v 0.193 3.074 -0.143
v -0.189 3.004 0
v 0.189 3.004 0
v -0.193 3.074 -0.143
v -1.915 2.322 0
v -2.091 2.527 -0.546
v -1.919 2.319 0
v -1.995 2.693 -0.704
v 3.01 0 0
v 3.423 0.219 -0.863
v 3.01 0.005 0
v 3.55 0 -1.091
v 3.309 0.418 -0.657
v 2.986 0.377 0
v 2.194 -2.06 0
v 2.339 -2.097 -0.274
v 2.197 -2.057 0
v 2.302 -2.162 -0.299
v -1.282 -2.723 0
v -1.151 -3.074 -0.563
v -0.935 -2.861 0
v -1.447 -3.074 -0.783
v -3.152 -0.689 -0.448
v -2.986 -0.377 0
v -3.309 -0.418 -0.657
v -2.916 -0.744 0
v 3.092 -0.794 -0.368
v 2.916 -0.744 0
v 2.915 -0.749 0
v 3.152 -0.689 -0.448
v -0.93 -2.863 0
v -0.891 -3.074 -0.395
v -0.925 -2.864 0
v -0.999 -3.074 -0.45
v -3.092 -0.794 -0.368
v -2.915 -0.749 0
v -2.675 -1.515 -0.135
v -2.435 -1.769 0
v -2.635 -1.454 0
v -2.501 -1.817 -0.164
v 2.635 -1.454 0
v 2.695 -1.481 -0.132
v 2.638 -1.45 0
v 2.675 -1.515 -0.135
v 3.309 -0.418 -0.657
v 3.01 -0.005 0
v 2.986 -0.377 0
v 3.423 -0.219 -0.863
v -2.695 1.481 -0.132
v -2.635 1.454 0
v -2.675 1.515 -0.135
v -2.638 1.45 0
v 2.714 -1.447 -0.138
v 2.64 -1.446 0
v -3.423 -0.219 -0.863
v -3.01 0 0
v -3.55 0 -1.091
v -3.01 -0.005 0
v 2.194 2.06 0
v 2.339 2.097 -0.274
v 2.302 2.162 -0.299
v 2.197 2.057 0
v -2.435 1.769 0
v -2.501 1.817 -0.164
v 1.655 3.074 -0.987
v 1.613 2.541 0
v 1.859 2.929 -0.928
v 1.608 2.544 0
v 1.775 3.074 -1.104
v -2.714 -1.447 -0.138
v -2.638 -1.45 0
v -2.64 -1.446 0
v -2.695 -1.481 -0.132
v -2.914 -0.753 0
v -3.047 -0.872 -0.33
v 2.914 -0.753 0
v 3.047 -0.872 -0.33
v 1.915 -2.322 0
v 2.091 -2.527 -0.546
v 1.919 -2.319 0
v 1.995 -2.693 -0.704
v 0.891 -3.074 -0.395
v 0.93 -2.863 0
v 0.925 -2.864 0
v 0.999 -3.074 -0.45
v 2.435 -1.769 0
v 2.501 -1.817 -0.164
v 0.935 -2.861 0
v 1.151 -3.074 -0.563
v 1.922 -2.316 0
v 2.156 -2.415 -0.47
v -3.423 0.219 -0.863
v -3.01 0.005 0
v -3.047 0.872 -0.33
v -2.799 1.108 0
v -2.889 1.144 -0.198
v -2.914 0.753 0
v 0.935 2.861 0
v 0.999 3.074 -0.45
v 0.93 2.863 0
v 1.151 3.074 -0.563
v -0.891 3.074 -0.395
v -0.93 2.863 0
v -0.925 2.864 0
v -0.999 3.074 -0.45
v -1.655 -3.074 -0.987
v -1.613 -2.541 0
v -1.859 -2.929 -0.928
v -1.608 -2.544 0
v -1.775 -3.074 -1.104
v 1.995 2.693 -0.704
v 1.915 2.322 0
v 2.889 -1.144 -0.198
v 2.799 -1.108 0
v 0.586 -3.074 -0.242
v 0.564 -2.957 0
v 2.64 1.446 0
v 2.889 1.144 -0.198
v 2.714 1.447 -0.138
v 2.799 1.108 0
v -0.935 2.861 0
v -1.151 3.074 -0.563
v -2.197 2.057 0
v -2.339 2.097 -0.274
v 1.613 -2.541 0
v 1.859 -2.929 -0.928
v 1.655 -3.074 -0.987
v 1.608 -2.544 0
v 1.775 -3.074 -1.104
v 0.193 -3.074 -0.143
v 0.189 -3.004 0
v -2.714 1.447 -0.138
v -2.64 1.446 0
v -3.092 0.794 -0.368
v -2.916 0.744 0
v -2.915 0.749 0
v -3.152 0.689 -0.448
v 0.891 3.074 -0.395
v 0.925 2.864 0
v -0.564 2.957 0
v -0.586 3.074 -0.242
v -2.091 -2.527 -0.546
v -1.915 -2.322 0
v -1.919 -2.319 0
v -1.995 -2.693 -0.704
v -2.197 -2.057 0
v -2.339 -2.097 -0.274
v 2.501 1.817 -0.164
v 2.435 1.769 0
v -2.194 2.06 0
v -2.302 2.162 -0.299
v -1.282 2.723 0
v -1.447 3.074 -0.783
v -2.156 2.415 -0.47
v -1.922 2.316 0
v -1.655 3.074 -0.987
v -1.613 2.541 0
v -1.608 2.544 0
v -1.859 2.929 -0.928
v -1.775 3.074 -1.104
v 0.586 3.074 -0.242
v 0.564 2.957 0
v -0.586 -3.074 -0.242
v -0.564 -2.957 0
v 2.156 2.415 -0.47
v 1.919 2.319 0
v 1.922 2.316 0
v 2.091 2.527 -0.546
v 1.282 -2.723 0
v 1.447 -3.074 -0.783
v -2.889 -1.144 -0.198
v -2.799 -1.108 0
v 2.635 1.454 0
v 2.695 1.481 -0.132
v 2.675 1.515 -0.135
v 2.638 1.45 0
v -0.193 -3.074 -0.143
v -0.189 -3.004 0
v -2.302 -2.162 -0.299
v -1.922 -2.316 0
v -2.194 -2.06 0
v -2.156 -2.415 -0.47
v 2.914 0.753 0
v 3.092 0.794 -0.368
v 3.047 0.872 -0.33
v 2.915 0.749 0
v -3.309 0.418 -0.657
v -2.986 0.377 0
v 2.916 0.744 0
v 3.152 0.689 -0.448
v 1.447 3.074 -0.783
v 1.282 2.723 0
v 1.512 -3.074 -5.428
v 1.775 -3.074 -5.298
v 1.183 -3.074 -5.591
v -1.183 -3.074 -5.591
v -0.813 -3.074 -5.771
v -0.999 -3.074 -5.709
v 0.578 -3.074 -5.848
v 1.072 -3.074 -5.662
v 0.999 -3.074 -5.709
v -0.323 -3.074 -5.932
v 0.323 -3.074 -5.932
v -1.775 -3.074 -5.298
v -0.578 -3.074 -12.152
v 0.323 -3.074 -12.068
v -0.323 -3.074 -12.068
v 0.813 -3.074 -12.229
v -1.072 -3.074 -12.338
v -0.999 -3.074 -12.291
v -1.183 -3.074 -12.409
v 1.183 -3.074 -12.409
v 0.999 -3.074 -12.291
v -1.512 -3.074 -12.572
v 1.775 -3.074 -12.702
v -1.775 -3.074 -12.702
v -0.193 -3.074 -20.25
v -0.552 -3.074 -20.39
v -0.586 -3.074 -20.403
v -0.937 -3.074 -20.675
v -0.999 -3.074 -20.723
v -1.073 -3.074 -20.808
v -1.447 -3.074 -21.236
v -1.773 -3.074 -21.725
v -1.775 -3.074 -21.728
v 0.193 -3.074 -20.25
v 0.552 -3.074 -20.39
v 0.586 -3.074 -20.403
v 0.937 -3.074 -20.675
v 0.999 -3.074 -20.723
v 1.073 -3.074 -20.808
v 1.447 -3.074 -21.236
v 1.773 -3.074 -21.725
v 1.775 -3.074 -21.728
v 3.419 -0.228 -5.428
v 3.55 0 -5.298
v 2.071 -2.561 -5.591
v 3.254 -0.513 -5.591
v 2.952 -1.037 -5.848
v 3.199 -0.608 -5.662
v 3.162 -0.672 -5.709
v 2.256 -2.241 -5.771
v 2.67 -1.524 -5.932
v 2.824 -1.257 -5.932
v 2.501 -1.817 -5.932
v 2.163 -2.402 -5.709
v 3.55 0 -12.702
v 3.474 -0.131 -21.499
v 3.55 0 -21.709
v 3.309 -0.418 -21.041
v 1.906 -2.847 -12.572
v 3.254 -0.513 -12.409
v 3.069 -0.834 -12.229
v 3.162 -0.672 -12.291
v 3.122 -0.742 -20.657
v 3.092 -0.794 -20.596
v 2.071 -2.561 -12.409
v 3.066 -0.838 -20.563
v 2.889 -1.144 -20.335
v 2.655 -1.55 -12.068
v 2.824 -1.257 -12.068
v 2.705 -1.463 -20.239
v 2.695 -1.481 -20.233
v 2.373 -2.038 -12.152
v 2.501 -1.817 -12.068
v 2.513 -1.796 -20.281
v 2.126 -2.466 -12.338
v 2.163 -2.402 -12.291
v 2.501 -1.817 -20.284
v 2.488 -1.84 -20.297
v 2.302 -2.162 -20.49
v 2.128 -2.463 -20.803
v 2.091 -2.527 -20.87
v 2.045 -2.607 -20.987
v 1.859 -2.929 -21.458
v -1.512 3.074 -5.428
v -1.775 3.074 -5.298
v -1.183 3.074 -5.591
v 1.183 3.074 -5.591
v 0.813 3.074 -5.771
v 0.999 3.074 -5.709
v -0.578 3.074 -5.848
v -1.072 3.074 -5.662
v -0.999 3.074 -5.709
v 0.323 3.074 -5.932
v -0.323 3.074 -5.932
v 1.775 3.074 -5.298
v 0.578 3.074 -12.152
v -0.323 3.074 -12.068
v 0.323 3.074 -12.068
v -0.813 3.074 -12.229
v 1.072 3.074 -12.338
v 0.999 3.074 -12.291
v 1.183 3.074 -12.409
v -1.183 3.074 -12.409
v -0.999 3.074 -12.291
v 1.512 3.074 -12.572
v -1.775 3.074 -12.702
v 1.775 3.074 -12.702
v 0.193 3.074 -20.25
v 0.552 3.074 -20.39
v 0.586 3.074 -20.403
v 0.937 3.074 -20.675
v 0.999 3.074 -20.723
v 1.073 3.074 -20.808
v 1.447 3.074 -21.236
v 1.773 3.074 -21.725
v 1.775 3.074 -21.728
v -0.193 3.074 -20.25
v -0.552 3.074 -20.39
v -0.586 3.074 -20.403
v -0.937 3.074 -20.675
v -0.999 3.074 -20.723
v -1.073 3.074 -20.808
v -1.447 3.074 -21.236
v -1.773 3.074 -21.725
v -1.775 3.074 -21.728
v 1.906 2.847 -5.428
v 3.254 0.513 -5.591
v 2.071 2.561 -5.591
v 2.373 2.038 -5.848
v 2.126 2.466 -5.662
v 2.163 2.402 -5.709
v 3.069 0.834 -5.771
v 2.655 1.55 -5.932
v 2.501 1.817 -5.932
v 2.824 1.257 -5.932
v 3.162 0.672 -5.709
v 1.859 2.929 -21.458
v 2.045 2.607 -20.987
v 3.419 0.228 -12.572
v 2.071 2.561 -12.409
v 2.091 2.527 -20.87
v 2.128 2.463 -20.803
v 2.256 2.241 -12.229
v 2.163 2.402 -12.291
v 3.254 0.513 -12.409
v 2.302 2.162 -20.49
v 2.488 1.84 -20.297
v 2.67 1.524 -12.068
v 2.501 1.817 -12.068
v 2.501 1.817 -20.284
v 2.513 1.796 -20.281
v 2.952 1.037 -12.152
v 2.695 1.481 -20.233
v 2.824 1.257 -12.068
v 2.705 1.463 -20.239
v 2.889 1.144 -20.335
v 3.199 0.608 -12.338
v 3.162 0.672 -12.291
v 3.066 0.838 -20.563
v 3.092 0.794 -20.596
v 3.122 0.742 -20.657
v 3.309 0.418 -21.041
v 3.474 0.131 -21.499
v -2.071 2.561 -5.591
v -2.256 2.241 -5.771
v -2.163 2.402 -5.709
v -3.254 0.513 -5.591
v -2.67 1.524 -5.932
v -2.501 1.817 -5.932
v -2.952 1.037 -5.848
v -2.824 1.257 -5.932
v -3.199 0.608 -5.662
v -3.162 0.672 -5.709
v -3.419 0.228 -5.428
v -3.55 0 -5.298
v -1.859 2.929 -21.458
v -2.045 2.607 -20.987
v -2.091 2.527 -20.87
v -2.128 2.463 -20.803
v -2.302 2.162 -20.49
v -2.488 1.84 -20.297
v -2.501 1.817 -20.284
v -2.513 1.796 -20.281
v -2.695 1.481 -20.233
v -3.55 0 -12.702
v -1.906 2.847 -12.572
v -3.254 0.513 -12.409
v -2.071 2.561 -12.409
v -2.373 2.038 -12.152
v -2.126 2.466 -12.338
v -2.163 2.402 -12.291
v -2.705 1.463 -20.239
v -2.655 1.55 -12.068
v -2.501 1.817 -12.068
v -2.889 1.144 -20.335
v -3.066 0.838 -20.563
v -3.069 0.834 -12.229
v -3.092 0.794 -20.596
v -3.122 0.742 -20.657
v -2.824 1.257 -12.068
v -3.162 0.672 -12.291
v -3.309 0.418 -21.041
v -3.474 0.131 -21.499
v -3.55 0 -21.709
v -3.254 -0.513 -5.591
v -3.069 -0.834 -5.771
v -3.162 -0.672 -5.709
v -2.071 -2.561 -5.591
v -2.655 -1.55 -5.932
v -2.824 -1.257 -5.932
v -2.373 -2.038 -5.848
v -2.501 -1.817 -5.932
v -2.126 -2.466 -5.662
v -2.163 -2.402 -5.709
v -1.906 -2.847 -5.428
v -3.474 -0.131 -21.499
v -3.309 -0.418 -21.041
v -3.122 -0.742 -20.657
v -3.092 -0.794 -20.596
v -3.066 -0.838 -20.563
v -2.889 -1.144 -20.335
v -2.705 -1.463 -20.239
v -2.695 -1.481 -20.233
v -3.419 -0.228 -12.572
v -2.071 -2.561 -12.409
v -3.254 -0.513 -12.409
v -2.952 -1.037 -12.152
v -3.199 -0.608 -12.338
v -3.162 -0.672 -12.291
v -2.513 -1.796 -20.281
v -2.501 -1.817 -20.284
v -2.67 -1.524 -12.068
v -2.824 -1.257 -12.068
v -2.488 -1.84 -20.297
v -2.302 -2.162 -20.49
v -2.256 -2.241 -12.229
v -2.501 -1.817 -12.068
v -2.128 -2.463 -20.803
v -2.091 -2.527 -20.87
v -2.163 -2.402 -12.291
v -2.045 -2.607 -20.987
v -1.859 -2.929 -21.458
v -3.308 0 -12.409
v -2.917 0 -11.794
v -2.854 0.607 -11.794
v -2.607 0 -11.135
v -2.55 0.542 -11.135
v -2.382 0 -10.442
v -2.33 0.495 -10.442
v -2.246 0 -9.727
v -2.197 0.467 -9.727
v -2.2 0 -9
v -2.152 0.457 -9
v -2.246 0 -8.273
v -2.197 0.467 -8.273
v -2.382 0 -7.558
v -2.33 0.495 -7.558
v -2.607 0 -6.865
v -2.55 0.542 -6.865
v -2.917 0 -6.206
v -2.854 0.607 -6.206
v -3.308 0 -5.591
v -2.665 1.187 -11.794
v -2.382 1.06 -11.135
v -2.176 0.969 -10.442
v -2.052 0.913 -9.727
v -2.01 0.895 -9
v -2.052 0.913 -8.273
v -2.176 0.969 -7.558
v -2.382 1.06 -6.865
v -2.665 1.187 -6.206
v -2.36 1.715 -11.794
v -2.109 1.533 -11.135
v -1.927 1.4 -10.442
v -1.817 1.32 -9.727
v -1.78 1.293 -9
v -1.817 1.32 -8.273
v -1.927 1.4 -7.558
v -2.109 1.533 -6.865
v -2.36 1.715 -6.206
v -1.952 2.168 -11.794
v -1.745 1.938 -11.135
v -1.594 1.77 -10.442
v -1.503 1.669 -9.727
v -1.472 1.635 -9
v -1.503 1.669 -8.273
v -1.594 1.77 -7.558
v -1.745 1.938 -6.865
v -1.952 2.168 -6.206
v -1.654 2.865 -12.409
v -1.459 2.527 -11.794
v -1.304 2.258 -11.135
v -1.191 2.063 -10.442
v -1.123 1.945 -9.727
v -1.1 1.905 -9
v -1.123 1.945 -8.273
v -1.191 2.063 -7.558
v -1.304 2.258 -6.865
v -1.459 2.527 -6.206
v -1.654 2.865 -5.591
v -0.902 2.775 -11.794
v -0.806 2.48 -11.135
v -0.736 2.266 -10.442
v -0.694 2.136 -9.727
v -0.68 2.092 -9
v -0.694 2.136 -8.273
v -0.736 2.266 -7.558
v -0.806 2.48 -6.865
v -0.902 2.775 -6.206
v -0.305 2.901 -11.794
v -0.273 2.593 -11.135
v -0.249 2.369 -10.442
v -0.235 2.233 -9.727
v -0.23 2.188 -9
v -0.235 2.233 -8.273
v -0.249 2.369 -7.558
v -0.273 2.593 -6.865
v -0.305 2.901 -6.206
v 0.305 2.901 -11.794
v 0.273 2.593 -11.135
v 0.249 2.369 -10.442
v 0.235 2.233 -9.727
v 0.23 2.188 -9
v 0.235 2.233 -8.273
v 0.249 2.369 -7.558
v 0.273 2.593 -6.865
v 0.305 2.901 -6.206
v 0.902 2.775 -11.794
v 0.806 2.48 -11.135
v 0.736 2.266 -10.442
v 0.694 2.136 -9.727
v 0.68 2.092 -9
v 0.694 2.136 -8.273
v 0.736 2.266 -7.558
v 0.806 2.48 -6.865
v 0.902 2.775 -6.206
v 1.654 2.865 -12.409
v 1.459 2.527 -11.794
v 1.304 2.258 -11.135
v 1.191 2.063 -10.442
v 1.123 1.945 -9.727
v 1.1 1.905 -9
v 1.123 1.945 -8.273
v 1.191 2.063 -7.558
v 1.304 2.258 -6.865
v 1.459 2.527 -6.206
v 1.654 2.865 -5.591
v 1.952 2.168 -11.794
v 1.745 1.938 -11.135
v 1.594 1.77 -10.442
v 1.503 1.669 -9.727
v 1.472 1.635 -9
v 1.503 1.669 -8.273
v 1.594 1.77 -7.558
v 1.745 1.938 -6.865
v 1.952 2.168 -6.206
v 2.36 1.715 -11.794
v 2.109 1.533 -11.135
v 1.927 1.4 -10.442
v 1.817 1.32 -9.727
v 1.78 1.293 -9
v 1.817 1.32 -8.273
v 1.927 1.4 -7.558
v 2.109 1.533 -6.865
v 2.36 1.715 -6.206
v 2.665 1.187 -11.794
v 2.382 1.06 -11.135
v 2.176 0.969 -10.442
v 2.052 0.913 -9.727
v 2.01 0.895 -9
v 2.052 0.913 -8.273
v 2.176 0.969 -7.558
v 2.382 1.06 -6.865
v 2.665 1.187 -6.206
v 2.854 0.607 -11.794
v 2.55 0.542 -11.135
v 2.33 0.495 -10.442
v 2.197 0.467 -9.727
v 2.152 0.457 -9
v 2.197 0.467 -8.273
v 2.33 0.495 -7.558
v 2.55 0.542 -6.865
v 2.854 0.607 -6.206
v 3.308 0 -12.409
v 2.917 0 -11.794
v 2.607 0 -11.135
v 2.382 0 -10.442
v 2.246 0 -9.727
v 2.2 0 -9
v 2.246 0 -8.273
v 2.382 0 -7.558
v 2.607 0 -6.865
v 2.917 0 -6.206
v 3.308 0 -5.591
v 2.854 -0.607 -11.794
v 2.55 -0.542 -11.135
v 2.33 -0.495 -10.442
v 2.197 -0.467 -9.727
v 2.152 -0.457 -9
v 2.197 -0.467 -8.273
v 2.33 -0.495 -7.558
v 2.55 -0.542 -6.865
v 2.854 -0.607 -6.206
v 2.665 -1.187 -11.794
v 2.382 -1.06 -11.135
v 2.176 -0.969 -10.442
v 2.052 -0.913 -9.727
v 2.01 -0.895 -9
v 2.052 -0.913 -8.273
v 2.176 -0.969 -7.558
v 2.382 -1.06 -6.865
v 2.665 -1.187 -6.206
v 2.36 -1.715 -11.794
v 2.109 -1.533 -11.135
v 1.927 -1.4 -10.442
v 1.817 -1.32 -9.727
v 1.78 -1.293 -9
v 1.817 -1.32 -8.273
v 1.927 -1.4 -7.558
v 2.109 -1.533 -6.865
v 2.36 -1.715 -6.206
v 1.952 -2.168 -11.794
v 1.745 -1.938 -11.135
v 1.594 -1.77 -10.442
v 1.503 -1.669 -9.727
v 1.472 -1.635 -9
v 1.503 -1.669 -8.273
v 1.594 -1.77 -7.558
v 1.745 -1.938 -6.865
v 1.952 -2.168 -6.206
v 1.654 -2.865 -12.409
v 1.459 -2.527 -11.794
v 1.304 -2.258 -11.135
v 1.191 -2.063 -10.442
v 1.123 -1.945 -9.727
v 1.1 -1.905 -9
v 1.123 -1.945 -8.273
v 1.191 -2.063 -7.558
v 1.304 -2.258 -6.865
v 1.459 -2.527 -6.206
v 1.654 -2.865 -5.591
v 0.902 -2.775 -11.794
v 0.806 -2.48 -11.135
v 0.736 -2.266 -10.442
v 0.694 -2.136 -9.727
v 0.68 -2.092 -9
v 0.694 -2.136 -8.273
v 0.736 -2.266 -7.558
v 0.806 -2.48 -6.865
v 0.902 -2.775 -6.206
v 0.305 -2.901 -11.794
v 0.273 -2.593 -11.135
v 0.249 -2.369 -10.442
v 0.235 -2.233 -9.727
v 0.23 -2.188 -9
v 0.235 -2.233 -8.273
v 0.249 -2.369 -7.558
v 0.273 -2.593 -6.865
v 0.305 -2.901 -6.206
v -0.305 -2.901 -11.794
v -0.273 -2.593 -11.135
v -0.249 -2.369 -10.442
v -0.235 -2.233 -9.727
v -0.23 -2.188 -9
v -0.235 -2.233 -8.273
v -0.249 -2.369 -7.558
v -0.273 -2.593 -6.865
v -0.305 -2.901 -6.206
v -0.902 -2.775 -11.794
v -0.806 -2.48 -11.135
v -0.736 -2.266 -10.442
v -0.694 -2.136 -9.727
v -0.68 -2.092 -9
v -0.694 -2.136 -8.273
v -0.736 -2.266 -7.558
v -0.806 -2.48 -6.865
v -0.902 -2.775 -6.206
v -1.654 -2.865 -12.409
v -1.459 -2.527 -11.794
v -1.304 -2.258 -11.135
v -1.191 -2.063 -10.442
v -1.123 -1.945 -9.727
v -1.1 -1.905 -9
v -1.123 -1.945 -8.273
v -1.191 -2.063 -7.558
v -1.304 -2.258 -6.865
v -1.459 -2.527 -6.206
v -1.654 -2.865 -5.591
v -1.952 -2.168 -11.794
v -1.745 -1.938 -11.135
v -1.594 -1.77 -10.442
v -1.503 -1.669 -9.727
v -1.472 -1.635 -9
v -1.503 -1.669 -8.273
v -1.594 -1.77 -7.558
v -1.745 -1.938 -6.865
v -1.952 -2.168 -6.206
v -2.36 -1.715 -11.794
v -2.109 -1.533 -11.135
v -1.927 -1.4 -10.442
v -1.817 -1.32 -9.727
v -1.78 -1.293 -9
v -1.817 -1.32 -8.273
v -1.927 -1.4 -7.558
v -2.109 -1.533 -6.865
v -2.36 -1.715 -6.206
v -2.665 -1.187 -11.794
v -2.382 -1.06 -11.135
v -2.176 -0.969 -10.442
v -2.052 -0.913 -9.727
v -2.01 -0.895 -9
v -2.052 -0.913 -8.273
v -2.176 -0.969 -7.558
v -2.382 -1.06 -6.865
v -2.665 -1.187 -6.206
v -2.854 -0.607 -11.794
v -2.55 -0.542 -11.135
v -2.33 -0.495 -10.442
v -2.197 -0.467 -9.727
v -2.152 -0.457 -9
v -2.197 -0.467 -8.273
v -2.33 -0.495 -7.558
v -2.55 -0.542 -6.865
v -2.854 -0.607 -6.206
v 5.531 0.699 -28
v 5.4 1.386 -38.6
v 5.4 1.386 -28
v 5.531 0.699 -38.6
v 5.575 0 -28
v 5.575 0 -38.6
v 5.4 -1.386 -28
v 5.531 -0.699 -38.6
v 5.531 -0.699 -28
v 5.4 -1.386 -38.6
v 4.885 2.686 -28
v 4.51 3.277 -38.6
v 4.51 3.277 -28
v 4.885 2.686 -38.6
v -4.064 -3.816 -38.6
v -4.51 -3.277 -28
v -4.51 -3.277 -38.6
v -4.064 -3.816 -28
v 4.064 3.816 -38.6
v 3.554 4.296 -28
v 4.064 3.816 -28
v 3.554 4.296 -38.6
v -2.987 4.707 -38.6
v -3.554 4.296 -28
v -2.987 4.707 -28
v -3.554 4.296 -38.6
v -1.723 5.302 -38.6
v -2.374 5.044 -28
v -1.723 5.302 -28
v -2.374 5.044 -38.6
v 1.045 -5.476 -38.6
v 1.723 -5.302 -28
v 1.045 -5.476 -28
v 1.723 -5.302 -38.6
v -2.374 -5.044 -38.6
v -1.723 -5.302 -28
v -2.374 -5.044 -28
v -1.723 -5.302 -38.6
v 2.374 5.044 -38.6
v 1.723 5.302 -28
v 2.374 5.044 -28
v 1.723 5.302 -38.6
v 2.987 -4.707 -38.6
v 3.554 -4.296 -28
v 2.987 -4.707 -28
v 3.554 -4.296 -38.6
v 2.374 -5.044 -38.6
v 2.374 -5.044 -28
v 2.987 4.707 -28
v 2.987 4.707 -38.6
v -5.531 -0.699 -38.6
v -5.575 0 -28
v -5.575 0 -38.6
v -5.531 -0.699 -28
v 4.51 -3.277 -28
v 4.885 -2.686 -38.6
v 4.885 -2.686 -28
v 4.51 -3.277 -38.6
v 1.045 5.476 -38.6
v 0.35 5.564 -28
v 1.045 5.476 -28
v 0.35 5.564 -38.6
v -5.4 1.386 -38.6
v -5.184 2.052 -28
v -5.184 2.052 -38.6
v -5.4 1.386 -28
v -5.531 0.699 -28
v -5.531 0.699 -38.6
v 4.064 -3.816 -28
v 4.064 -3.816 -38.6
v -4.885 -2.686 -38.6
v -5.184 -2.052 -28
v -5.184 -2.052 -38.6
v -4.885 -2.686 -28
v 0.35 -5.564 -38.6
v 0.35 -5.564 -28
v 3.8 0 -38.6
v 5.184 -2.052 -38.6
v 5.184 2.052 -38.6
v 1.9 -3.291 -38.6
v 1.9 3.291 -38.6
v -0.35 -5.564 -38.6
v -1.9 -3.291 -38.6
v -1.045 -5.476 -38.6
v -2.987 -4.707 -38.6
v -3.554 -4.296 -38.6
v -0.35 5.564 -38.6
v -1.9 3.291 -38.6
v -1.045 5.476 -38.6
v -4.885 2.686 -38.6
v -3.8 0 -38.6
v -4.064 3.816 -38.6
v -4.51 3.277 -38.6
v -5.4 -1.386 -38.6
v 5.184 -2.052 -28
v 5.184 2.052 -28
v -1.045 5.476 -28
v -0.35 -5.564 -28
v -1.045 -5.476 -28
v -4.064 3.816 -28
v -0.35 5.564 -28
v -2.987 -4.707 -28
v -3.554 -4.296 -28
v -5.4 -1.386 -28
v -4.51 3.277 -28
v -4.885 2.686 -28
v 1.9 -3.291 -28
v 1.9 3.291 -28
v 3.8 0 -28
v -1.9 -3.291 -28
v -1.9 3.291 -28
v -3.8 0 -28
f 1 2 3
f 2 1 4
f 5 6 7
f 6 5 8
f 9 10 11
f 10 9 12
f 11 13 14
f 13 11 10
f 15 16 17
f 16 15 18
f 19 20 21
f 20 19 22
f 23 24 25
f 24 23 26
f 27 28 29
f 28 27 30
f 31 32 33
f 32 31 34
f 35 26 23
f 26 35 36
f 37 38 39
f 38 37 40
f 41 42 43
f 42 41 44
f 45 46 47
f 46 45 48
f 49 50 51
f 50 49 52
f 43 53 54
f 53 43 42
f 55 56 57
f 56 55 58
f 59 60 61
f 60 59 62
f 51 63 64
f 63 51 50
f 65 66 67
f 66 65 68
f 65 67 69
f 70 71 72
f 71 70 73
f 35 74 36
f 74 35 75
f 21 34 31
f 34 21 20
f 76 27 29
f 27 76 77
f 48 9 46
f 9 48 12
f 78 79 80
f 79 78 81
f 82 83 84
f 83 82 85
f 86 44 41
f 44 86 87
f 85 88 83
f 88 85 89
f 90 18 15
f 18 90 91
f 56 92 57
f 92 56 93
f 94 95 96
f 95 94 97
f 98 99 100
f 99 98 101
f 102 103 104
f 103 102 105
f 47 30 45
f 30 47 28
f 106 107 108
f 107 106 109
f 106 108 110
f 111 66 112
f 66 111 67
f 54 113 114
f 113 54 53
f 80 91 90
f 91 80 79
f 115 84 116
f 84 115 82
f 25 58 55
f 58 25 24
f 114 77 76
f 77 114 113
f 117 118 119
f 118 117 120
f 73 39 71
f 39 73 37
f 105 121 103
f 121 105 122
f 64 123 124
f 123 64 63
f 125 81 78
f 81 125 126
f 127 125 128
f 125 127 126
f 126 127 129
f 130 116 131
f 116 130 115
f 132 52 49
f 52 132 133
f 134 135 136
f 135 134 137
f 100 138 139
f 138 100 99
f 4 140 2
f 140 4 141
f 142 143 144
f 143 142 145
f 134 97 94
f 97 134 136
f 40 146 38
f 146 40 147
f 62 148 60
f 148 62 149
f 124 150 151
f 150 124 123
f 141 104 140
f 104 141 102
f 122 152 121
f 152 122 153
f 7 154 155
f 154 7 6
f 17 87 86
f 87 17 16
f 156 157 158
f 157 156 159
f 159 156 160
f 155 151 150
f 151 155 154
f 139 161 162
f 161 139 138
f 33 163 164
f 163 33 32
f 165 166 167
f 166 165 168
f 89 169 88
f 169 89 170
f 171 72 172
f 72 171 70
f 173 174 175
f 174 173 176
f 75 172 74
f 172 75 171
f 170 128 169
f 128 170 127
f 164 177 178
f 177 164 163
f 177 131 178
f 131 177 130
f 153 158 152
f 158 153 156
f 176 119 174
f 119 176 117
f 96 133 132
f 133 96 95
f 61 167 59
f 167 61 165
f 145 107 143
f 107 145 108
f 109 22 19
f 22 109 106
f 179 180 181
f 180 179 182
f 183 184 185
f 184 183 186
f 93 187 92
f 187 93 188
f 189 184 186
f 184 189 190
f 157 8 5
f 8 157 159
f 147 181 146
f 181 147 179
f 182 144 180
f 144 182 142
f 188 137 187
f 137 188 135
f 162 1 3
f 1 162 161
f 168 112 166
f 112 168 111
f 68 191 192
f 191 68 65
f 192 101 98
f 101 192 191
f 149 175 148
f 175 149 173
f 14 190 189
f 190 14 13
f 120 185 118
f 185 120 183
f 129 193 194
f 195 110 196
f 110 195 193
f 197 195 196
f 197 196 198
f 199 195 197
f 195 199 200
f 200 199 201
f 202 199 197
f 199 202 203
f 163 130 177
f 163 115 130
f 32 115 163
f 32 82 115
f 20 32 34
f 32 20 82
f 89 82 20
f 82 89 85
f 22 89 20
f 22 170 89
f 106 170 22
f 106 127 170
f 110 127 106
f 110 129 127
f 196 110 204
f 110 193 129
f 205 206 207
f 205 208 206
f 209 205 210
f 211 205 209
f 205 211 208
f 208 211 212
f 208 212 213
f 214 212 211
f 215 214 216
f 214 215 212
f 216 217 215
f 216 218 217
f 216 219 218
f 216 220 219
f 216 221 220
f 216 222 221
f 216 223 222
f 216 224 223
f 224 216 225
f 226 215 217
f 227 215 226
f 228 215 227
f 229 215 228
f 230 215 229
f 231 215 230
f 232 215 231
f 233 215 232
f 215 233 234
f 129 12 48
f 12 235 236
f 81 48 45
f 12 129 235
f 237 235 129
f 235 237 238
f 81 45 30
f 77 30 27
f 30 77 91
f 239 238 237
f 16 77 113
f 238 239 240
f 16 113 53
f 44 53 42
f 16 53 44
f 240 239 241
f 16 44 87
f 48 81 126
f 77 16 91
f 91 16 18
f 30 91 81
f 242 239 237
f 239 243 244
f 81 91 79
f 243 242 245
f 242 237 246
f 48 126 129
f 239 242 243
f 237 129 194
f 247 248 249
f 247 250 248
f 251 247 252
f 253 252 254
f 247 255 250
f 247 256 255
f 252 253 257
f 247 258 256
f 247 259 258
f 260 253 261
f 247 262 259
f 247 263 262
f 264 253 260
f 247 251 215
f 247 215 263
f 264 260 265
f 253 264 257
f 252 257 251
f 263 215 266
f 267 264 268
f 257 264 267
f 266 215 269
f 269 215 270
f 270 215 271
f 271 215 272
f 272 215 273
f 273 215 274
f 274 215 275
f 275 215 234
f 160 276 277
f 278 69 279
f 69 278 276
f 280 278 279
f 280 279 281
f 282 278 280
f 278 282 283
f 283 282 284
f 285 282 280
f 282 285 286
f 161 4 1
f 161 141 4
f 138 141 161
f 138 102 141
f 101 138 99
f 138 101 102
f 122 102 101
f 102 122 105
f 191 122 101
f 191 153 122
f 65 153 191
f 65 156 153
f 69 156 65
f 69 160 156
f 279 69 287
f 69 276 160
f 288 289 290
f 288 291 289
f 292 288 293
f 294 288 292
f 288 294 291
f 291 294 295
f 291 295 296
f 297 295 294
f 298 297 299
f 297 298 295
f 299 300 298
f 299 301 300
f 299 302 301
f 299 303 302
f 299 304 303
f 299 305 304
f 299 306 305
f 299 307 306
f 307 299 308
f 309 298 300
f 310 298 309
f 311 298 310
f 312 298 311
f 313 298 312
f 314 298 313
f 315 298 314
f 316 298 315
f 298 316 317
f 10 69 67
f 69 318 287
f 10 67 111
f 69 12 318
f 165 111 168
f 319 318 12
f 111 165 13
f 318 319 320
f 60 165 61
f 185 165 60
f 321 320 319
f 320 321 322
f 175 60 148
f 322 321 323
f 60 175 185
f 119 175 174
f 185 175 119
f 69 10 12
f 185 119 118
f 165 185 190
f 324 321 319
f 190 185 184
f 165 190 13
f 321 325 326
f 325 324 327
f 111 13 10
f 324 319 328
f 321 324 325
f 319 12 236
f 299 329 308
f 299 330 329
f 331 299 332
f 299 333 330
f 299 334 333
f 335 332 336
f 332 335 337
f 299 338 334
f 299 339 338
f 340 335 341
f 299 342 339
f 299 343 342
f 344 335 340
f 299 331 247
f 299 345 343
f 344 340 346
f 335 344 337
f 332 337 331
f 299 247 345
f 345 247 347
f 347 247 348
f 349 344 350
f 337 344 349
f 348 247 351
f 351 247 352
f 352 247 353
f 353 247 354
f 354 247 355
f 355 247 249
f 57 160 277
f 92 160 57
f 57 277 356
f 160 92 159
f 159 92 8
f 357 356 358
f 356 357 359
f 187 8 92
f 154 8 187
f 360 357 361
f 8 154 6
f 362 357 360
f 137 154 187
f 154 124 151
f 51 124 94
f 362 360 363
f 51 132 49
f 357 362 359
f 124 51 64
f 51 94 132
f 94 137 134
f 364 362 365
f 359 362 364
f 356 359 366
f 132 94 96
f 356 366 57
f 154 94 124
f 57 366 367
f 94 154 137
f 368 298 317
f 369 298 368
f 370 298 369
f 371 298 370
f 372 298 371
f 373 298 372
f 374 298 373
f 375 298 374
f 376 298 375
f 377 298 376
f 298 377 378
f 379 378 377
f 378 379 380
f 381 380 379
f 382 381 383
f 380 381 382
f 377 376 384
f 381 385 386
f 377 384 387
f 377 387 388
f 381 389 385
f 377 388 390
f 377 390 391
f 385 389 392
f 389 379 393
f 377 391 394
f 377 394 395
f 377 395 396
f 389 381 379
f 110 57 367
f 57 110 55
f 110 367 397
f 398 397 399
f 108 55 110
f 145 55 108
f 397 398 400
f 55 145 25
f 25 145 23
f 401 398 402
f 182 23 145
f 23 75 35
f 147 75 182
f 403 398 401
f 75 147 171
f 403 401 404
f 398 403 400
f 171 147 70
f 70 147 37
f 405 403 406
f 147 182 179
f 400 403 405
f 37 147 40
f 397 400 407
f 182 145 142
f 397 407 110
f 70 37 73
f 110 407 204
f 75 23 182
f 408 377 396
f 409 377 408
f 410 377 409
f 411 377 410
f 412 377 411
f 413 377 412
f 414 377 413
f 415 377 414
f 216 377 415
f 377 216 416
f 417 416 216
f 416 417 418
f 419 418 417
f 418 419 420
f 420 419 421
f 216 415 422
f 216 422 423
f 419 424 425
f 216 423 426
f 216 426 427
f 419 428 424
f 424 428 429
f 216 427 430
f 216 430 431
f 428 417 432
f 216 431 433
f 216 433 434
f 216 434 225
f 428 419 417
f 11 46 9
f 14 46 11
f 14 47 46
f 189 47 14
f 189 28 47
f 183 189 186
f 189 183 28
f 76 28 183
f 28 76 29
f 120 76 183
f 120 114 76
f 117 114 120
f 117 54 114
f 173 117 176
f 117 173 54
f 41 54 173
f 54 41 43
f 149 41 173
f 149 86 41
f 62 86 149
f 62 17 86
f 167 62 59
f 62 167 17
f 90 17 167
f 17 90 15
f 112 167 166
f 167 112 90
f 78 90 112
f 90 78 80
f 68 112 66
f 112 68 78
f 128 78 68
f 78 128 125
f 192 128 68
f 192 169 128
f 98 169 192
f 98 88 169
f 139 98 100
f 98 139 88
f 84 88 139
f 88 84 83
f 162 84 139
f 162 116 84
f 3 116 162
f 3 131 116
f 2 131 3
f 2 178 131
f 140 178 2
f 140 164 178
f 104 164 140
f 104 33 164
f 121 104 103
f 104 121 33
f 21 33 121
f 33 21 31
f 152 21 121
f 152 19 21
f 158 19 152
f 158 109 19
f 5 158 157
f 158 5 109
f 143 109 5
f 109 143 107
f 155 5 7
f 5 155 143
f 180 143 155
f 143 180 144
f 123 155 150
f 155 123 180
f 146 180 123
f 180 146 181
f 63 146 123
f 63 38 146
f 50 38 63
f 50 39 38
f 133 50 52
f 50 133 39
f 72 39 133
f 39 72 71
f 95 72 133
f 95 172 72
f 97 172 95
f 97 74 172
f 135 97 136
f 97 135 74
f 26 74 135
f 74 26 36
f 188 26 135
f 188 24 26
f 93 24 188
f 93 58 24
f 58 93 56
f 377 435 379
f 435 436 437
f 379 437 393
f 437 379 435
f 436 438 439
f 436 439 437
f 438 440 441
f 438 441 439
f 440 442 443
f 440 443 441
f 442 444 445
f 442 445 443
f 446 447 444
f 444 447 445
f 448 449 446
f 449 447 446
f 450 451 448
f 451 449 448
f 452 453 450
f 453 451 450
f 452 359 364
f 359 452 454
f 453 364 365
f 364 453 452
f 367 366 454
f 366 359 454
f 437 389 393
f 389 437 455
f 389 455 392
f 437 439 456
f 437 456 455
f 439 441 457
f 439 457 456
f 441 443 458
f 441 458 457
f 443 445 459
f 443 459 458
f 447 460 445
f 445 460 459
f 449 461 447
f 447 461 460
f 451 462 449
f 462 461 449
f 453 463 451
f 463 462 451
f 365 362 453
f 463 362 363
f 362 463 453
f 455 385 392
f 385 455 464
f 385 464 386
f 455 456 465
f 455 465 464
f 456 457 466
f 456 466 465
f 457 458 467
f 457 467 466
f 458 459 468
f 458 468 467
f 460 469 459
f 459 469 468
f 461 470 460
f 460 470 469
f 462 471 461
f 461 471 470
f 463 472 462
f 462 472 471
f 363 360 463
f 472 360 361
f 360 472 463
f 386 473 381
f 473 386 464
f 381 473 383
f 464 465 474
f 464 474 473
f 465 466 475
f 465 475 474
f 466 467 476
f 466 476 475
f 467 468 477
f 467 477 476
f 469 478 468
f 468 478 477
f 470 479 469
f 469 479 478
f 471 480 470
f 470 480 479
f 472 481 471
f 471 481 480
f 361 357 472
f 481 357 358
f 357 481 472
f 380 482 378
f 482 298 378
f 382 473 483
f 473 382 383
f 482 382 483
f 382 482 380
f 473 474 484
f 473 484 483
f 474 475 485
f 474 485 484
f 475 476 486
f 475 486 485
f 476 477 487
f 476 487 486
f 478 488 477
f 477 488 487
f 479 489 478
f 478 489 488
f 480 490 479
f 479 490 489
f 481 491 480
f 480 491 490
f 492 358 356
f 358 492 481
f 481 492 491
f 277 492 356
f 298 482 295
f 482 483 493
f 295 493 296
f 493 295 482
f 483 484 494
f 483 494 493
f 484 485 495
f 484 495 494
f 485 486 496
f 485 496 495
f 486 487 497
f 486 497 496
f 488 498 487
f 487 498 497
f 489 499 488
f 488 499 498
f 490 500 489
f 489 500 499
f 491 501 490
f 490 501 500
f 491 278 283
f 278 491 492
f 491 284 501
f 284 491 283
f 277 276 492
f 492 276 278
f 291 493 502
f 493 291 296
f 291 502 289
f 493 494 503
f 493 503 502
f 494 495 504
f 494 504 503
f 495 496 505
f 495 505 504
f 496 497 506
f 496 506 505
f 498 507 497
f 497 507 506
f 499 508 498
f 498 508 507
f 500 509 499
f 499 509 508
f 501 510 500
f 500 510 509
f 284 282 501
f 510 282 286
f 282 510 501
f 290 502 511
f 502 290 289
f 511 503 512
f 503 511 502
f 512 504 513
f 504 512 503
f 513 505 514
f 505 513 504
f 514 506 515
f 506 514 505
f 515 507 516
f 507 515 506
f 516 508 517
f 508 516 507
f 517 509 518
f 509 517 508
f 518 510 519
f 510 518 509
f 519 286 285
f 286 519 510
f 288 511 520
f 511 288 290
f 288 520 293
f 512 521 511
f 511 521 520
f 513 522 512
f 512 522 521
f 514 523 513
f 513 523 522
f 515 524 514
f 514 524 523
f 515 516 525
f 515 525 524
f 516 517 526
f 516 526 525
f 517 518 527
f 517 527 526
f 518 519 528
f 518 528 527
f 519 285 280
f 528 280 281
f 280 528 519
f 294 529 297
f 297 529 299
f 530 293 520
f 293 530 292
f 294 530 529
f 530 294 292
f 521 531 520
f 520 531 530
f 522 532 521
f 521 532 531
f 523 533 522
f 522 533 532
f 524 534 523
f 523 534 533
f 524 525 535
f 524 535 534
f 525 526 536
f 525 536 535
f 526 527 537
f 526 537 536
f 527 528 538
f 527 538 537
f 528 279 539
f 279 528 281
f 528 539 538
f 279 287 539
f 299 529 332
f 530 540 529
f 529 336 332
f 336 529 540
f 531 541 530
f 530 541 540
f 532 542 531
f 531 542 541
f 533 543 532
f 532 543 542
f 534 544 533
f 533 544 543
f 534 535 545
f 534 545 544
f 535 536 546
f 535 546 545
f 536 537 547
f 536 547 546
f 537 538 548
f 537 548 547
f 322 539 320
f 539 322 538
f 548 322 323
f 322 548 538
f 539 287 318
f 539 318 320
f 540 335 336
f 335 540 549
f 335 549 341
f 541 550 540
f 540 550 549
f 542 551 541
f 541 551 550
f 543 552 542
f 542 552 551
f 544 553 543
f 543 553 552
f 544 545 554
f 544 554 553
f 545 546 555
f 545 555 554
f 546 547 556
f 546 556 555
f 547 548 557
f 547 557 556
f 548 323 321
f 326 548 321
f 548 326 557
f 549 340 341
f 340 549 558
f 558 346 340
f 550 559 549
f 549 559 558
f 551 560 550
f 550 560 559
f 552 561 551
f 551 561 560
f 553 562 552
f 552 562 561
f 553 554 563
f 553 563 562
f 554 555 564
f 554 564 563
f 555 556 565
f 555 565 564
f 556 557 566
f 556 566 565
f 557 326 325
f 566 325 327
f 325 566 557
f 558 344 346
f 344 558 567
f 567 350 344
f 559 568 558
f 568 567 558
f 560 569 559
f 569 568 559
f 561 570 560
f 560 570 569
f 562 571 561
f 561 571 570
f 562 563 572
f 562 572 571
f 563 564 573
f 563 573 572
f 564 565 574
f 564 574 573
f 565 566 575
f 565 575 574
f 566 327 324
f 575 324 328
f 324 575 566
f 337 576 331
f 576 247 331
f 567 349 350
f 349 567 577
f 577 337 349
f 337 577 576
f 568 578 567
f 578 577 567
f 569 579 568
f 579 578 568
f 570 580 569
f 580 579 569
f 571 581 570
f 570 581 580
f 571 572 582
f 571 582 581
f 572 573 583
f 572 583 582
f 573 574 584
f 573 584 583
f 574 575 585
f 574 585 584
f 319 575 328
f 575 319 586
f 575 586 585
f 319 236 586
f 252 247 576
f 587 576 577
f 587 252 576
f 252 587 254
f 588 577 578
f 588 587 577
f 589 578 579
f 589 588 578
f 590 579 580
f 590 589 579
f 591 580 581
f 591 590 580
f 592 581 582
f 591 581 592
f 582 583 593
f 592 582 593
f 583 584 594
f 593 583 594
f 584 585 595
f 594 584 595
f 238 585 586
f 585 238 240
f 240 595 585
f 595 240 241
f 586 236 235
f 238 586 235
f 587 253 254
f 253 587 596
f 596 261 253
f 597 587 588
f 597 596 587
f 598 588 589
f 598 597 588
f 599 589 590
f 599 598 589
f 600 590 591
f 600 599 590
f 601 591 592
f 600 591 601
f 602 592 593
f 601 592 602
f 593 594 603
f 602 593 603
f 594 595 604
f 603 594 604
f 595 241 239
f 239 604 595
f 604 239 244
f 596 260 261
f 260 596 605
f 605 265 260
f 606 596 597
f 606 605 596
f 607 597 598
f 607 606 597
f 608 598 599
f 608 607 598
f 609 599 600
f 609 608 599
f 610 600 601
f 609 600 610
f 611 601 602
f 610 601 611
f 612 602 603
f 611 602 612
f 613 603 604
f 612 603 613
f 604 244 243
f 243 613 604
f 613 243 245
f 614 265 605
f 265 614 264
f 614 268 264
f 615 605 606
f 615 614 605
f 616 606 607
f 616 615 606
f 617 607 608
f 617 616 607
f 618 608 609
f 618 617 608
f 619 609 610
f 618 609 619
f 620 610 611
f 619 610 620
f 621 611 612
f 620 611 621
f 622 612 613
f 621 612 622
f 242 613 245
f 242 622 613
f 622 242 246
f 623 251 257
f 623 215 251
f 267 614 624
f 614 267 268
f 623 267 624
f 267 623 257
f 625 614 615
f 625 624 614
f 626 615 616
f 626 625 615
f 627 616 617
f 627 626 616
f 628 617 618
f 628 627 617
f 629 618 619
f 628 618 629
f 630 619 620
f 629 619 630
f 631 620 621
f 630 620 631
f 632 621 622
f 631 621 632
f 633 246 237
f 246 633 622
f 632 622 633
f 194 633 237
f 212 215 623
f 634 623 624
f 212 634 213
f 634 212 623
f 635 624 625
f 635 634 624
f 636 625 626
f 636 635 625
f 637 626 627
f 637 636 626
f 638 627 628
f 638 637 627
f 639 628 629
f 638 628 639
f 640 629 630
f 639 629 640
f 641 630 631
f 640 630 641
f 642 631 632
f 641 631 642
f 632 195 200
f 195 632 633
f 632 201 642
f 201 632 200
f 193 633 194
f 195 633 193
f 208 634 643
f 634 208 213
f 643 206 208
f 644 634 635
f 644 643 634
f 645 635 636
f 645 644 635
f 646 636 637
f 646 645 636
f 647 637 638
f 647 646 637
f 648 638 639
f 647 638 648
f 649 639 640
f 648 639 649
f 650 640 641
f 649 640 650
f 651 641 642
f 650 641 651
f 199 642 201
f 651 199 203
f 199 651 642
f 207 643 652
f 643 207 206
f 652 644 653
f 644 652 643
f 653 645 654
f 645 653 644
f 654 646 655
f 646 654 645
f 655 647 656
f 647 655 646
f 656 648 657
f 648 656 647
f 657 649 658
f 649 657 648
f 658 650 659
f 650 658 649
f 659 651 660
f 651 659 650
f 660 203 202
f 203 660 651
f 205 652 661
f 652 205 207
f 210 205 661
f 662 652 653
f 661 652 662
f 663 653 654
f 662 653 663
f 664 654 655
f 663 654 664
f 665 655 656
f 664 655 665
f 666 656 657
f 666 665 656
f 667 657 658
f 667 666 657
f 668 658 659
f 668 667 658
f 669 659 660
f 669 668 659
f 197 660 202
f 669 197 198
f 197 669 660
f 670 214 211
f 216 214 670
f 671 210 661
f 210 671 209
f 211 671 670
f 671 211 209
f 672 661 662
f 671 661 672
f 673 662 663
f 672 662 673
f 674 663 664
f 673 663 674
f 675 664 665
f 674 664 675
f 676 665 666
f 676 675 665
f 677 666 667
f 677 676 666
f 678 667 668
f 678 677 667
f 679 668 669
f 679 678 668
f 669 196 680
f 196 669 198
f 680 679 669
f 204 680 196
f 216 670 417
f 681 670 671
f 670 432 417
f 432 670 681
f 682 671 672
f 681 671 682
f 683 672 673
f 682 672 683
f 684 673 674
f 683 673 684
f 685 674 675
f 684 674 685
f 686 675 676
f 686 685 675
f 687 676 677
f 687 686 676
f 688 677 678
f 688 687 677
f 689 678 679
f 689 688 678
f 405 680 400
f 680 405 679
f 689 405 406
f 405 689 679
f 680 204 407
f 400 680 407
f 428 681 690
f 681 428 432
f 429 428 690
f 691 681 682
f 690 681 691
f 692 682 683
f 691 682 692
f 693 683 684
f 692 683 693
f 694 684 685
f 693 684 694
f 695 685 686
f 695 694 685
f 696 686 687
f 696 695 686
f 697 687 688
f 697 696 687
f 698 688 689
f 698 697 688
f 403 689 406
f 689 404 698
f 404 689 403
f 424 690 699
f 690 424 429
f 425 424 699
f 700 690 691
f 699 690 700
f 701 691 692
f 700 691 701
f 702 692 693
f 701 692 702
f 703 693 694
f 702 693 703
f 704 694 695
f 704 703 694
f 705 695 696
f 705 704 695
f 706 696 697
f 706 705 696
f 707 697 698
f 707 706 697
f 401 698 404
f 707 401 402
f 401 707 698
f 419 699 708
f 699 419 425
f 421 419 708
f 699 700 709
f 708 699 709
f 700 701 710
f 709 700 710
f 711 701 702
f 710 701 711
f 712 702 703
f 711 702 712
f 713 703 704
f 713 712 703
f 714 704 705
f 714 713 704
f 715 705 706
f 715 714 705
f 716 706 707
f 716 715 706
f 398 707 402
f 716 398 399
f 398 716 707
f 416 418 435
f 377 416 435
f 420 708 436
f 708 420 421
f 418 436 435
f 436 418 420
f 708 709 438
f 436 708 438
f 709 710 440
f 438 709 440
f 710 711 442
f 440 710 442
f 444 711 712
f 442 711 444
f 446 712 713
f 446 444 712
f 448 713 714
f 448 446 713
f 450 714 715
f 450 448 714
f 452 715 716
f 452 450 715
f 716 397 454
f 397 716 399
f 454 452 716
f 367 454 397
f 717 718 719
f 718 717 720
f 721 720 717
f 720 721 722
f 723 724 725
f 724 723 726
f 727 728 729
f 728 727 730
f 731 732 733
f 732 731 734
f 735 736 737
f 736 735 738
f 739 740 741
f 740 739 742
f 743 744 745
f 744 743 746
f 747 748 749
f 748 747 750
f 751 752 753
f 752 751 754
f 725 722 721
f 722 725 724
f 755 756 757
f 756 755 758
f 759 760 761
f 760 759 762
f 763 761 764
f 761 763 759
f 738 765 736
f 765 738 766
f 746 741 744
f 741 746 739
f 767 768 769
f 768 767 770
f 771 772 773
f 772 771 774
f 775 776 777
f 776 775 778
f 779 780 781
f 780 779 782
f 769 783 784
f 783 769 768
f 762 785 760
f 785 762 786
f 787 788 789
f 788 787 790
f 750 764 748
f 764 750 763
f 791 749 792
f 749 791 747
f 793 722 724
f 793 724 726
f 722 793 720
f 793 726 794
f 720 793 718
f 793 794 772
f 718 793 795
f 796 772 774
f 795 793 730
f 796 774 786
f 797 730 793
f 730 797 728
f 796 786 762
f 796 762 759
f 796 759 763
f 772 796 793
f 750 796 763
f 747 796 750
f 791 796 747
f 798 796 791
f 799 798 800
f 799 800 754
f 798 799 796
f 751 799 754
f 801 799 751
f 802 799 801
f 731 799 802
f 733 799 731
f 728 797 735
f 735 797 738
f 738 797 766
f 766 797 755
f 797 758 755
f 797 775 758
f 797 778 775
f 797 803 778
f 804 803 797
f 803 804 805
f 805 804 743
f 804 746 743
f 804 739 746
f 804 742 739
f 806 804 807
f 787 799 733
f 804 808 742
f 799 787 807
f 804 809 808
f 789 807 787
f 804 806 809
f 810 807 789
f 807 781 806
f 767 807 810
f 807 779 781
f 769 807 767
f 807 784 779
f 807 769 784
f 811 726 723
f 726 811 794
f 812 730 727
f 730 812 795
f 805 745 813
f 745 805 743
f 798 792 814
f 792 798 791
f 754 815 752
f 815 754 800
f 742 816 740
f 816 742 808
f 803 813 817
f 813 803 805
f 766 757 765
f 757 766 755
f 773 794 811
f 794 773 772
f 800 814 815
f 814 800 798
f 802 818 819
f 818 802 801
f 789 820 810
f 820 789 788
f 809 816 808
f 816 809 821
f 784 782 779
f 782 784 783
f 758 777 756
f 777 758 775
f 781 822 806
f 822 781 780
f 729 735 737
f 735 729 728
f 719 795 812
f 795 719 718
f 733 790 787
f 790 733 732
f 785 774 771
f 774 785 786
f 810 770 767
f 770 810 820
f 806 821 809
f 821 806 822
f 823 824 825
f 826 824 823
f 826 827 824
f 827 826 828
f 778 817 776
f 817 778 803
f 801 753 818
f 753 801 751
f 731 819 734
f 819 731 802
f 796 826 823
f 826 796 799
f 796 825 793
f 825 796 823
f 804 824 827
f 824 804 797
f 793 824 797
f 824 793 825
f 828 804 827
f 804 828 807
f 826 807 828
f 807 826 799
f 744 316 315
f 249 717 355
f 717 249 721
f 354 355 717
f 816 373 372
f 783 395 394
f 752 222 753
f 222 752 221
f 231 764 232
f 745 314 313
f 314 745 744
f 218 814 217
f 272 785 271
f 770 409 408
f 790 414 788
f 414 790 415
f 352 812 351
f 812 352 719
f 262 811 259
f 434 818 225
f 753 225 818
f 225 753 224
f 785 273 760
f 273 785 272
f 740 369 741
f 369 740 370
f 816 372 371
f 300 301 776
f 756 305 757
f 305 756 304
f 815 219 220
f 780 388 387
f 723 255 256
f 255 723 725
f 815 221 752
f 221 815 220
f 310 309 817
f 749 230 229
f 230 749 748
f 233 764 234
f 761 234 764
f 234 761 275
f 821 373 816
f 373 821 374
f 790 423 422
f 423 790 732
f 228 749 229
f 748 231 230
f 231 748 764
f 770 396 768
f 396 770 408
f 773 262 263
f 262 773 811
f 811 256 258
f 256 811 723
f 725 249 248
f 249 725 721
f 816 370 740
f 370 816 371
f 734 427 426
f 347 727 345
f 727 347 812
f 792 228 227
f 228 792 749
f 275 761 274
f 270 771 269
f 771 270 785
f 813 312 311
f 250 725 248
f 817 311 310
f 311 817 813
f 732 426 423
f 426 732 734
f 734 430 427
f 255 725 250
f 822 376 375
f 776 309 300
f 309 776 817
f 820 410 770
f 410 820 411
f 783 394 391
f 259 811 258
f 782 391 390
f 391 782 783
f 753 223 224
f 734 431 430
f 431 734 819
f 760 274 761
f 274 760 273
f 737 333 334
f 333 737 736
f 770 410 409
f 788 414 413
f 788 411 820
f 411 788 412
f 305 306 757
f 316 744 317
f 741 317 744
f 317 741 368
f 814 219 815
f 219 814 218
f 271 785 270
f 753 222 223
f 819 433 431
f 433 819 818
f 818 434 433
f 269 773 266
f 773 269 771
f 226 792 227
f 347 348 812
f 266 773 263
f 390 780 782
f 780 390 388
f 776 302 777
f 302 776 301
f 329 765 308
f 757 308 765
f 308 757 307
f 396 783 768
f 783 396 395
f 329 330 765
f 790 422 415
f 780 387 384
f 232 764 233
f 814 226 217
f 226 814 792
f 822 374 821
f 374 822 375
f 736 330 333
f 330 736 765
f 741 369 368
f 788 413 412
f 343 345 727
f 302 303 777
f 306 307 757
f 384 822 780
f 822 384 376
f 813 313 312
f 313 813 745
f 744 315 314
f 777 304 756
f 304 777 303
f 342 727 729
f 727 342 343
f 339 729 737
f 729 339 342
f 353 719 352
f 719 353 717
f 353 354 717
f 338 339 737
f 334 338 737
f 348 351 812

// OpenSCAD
mirror([0,0,1]){
  difference(){
cylinder(d=7.1,h=24,$fn=6);
translate([0,0,9]) rotate_extrude()
{
  translate([8,0]) circle(d=11.6,$fn=50);
}

  translate([0,0,-.01]) difference(){
    cylinder(d=10,h=2,$fn=50);
    translate([0,0,-.01]) cylinder(d1=6,d2=8,h=2.02,$fn=50);
  }
}
translate([0,0,20])
  cylinder(d1=6,d2=11.15,h=8,$fn=50);
translate([0,0,28])
  difference() {
    cylinder(d=11.15,h=10.6,$fn=50);
    translate([0,0,-.01]) cylinder(d=7.6,h=10.8,$fn=6);
  }
}
